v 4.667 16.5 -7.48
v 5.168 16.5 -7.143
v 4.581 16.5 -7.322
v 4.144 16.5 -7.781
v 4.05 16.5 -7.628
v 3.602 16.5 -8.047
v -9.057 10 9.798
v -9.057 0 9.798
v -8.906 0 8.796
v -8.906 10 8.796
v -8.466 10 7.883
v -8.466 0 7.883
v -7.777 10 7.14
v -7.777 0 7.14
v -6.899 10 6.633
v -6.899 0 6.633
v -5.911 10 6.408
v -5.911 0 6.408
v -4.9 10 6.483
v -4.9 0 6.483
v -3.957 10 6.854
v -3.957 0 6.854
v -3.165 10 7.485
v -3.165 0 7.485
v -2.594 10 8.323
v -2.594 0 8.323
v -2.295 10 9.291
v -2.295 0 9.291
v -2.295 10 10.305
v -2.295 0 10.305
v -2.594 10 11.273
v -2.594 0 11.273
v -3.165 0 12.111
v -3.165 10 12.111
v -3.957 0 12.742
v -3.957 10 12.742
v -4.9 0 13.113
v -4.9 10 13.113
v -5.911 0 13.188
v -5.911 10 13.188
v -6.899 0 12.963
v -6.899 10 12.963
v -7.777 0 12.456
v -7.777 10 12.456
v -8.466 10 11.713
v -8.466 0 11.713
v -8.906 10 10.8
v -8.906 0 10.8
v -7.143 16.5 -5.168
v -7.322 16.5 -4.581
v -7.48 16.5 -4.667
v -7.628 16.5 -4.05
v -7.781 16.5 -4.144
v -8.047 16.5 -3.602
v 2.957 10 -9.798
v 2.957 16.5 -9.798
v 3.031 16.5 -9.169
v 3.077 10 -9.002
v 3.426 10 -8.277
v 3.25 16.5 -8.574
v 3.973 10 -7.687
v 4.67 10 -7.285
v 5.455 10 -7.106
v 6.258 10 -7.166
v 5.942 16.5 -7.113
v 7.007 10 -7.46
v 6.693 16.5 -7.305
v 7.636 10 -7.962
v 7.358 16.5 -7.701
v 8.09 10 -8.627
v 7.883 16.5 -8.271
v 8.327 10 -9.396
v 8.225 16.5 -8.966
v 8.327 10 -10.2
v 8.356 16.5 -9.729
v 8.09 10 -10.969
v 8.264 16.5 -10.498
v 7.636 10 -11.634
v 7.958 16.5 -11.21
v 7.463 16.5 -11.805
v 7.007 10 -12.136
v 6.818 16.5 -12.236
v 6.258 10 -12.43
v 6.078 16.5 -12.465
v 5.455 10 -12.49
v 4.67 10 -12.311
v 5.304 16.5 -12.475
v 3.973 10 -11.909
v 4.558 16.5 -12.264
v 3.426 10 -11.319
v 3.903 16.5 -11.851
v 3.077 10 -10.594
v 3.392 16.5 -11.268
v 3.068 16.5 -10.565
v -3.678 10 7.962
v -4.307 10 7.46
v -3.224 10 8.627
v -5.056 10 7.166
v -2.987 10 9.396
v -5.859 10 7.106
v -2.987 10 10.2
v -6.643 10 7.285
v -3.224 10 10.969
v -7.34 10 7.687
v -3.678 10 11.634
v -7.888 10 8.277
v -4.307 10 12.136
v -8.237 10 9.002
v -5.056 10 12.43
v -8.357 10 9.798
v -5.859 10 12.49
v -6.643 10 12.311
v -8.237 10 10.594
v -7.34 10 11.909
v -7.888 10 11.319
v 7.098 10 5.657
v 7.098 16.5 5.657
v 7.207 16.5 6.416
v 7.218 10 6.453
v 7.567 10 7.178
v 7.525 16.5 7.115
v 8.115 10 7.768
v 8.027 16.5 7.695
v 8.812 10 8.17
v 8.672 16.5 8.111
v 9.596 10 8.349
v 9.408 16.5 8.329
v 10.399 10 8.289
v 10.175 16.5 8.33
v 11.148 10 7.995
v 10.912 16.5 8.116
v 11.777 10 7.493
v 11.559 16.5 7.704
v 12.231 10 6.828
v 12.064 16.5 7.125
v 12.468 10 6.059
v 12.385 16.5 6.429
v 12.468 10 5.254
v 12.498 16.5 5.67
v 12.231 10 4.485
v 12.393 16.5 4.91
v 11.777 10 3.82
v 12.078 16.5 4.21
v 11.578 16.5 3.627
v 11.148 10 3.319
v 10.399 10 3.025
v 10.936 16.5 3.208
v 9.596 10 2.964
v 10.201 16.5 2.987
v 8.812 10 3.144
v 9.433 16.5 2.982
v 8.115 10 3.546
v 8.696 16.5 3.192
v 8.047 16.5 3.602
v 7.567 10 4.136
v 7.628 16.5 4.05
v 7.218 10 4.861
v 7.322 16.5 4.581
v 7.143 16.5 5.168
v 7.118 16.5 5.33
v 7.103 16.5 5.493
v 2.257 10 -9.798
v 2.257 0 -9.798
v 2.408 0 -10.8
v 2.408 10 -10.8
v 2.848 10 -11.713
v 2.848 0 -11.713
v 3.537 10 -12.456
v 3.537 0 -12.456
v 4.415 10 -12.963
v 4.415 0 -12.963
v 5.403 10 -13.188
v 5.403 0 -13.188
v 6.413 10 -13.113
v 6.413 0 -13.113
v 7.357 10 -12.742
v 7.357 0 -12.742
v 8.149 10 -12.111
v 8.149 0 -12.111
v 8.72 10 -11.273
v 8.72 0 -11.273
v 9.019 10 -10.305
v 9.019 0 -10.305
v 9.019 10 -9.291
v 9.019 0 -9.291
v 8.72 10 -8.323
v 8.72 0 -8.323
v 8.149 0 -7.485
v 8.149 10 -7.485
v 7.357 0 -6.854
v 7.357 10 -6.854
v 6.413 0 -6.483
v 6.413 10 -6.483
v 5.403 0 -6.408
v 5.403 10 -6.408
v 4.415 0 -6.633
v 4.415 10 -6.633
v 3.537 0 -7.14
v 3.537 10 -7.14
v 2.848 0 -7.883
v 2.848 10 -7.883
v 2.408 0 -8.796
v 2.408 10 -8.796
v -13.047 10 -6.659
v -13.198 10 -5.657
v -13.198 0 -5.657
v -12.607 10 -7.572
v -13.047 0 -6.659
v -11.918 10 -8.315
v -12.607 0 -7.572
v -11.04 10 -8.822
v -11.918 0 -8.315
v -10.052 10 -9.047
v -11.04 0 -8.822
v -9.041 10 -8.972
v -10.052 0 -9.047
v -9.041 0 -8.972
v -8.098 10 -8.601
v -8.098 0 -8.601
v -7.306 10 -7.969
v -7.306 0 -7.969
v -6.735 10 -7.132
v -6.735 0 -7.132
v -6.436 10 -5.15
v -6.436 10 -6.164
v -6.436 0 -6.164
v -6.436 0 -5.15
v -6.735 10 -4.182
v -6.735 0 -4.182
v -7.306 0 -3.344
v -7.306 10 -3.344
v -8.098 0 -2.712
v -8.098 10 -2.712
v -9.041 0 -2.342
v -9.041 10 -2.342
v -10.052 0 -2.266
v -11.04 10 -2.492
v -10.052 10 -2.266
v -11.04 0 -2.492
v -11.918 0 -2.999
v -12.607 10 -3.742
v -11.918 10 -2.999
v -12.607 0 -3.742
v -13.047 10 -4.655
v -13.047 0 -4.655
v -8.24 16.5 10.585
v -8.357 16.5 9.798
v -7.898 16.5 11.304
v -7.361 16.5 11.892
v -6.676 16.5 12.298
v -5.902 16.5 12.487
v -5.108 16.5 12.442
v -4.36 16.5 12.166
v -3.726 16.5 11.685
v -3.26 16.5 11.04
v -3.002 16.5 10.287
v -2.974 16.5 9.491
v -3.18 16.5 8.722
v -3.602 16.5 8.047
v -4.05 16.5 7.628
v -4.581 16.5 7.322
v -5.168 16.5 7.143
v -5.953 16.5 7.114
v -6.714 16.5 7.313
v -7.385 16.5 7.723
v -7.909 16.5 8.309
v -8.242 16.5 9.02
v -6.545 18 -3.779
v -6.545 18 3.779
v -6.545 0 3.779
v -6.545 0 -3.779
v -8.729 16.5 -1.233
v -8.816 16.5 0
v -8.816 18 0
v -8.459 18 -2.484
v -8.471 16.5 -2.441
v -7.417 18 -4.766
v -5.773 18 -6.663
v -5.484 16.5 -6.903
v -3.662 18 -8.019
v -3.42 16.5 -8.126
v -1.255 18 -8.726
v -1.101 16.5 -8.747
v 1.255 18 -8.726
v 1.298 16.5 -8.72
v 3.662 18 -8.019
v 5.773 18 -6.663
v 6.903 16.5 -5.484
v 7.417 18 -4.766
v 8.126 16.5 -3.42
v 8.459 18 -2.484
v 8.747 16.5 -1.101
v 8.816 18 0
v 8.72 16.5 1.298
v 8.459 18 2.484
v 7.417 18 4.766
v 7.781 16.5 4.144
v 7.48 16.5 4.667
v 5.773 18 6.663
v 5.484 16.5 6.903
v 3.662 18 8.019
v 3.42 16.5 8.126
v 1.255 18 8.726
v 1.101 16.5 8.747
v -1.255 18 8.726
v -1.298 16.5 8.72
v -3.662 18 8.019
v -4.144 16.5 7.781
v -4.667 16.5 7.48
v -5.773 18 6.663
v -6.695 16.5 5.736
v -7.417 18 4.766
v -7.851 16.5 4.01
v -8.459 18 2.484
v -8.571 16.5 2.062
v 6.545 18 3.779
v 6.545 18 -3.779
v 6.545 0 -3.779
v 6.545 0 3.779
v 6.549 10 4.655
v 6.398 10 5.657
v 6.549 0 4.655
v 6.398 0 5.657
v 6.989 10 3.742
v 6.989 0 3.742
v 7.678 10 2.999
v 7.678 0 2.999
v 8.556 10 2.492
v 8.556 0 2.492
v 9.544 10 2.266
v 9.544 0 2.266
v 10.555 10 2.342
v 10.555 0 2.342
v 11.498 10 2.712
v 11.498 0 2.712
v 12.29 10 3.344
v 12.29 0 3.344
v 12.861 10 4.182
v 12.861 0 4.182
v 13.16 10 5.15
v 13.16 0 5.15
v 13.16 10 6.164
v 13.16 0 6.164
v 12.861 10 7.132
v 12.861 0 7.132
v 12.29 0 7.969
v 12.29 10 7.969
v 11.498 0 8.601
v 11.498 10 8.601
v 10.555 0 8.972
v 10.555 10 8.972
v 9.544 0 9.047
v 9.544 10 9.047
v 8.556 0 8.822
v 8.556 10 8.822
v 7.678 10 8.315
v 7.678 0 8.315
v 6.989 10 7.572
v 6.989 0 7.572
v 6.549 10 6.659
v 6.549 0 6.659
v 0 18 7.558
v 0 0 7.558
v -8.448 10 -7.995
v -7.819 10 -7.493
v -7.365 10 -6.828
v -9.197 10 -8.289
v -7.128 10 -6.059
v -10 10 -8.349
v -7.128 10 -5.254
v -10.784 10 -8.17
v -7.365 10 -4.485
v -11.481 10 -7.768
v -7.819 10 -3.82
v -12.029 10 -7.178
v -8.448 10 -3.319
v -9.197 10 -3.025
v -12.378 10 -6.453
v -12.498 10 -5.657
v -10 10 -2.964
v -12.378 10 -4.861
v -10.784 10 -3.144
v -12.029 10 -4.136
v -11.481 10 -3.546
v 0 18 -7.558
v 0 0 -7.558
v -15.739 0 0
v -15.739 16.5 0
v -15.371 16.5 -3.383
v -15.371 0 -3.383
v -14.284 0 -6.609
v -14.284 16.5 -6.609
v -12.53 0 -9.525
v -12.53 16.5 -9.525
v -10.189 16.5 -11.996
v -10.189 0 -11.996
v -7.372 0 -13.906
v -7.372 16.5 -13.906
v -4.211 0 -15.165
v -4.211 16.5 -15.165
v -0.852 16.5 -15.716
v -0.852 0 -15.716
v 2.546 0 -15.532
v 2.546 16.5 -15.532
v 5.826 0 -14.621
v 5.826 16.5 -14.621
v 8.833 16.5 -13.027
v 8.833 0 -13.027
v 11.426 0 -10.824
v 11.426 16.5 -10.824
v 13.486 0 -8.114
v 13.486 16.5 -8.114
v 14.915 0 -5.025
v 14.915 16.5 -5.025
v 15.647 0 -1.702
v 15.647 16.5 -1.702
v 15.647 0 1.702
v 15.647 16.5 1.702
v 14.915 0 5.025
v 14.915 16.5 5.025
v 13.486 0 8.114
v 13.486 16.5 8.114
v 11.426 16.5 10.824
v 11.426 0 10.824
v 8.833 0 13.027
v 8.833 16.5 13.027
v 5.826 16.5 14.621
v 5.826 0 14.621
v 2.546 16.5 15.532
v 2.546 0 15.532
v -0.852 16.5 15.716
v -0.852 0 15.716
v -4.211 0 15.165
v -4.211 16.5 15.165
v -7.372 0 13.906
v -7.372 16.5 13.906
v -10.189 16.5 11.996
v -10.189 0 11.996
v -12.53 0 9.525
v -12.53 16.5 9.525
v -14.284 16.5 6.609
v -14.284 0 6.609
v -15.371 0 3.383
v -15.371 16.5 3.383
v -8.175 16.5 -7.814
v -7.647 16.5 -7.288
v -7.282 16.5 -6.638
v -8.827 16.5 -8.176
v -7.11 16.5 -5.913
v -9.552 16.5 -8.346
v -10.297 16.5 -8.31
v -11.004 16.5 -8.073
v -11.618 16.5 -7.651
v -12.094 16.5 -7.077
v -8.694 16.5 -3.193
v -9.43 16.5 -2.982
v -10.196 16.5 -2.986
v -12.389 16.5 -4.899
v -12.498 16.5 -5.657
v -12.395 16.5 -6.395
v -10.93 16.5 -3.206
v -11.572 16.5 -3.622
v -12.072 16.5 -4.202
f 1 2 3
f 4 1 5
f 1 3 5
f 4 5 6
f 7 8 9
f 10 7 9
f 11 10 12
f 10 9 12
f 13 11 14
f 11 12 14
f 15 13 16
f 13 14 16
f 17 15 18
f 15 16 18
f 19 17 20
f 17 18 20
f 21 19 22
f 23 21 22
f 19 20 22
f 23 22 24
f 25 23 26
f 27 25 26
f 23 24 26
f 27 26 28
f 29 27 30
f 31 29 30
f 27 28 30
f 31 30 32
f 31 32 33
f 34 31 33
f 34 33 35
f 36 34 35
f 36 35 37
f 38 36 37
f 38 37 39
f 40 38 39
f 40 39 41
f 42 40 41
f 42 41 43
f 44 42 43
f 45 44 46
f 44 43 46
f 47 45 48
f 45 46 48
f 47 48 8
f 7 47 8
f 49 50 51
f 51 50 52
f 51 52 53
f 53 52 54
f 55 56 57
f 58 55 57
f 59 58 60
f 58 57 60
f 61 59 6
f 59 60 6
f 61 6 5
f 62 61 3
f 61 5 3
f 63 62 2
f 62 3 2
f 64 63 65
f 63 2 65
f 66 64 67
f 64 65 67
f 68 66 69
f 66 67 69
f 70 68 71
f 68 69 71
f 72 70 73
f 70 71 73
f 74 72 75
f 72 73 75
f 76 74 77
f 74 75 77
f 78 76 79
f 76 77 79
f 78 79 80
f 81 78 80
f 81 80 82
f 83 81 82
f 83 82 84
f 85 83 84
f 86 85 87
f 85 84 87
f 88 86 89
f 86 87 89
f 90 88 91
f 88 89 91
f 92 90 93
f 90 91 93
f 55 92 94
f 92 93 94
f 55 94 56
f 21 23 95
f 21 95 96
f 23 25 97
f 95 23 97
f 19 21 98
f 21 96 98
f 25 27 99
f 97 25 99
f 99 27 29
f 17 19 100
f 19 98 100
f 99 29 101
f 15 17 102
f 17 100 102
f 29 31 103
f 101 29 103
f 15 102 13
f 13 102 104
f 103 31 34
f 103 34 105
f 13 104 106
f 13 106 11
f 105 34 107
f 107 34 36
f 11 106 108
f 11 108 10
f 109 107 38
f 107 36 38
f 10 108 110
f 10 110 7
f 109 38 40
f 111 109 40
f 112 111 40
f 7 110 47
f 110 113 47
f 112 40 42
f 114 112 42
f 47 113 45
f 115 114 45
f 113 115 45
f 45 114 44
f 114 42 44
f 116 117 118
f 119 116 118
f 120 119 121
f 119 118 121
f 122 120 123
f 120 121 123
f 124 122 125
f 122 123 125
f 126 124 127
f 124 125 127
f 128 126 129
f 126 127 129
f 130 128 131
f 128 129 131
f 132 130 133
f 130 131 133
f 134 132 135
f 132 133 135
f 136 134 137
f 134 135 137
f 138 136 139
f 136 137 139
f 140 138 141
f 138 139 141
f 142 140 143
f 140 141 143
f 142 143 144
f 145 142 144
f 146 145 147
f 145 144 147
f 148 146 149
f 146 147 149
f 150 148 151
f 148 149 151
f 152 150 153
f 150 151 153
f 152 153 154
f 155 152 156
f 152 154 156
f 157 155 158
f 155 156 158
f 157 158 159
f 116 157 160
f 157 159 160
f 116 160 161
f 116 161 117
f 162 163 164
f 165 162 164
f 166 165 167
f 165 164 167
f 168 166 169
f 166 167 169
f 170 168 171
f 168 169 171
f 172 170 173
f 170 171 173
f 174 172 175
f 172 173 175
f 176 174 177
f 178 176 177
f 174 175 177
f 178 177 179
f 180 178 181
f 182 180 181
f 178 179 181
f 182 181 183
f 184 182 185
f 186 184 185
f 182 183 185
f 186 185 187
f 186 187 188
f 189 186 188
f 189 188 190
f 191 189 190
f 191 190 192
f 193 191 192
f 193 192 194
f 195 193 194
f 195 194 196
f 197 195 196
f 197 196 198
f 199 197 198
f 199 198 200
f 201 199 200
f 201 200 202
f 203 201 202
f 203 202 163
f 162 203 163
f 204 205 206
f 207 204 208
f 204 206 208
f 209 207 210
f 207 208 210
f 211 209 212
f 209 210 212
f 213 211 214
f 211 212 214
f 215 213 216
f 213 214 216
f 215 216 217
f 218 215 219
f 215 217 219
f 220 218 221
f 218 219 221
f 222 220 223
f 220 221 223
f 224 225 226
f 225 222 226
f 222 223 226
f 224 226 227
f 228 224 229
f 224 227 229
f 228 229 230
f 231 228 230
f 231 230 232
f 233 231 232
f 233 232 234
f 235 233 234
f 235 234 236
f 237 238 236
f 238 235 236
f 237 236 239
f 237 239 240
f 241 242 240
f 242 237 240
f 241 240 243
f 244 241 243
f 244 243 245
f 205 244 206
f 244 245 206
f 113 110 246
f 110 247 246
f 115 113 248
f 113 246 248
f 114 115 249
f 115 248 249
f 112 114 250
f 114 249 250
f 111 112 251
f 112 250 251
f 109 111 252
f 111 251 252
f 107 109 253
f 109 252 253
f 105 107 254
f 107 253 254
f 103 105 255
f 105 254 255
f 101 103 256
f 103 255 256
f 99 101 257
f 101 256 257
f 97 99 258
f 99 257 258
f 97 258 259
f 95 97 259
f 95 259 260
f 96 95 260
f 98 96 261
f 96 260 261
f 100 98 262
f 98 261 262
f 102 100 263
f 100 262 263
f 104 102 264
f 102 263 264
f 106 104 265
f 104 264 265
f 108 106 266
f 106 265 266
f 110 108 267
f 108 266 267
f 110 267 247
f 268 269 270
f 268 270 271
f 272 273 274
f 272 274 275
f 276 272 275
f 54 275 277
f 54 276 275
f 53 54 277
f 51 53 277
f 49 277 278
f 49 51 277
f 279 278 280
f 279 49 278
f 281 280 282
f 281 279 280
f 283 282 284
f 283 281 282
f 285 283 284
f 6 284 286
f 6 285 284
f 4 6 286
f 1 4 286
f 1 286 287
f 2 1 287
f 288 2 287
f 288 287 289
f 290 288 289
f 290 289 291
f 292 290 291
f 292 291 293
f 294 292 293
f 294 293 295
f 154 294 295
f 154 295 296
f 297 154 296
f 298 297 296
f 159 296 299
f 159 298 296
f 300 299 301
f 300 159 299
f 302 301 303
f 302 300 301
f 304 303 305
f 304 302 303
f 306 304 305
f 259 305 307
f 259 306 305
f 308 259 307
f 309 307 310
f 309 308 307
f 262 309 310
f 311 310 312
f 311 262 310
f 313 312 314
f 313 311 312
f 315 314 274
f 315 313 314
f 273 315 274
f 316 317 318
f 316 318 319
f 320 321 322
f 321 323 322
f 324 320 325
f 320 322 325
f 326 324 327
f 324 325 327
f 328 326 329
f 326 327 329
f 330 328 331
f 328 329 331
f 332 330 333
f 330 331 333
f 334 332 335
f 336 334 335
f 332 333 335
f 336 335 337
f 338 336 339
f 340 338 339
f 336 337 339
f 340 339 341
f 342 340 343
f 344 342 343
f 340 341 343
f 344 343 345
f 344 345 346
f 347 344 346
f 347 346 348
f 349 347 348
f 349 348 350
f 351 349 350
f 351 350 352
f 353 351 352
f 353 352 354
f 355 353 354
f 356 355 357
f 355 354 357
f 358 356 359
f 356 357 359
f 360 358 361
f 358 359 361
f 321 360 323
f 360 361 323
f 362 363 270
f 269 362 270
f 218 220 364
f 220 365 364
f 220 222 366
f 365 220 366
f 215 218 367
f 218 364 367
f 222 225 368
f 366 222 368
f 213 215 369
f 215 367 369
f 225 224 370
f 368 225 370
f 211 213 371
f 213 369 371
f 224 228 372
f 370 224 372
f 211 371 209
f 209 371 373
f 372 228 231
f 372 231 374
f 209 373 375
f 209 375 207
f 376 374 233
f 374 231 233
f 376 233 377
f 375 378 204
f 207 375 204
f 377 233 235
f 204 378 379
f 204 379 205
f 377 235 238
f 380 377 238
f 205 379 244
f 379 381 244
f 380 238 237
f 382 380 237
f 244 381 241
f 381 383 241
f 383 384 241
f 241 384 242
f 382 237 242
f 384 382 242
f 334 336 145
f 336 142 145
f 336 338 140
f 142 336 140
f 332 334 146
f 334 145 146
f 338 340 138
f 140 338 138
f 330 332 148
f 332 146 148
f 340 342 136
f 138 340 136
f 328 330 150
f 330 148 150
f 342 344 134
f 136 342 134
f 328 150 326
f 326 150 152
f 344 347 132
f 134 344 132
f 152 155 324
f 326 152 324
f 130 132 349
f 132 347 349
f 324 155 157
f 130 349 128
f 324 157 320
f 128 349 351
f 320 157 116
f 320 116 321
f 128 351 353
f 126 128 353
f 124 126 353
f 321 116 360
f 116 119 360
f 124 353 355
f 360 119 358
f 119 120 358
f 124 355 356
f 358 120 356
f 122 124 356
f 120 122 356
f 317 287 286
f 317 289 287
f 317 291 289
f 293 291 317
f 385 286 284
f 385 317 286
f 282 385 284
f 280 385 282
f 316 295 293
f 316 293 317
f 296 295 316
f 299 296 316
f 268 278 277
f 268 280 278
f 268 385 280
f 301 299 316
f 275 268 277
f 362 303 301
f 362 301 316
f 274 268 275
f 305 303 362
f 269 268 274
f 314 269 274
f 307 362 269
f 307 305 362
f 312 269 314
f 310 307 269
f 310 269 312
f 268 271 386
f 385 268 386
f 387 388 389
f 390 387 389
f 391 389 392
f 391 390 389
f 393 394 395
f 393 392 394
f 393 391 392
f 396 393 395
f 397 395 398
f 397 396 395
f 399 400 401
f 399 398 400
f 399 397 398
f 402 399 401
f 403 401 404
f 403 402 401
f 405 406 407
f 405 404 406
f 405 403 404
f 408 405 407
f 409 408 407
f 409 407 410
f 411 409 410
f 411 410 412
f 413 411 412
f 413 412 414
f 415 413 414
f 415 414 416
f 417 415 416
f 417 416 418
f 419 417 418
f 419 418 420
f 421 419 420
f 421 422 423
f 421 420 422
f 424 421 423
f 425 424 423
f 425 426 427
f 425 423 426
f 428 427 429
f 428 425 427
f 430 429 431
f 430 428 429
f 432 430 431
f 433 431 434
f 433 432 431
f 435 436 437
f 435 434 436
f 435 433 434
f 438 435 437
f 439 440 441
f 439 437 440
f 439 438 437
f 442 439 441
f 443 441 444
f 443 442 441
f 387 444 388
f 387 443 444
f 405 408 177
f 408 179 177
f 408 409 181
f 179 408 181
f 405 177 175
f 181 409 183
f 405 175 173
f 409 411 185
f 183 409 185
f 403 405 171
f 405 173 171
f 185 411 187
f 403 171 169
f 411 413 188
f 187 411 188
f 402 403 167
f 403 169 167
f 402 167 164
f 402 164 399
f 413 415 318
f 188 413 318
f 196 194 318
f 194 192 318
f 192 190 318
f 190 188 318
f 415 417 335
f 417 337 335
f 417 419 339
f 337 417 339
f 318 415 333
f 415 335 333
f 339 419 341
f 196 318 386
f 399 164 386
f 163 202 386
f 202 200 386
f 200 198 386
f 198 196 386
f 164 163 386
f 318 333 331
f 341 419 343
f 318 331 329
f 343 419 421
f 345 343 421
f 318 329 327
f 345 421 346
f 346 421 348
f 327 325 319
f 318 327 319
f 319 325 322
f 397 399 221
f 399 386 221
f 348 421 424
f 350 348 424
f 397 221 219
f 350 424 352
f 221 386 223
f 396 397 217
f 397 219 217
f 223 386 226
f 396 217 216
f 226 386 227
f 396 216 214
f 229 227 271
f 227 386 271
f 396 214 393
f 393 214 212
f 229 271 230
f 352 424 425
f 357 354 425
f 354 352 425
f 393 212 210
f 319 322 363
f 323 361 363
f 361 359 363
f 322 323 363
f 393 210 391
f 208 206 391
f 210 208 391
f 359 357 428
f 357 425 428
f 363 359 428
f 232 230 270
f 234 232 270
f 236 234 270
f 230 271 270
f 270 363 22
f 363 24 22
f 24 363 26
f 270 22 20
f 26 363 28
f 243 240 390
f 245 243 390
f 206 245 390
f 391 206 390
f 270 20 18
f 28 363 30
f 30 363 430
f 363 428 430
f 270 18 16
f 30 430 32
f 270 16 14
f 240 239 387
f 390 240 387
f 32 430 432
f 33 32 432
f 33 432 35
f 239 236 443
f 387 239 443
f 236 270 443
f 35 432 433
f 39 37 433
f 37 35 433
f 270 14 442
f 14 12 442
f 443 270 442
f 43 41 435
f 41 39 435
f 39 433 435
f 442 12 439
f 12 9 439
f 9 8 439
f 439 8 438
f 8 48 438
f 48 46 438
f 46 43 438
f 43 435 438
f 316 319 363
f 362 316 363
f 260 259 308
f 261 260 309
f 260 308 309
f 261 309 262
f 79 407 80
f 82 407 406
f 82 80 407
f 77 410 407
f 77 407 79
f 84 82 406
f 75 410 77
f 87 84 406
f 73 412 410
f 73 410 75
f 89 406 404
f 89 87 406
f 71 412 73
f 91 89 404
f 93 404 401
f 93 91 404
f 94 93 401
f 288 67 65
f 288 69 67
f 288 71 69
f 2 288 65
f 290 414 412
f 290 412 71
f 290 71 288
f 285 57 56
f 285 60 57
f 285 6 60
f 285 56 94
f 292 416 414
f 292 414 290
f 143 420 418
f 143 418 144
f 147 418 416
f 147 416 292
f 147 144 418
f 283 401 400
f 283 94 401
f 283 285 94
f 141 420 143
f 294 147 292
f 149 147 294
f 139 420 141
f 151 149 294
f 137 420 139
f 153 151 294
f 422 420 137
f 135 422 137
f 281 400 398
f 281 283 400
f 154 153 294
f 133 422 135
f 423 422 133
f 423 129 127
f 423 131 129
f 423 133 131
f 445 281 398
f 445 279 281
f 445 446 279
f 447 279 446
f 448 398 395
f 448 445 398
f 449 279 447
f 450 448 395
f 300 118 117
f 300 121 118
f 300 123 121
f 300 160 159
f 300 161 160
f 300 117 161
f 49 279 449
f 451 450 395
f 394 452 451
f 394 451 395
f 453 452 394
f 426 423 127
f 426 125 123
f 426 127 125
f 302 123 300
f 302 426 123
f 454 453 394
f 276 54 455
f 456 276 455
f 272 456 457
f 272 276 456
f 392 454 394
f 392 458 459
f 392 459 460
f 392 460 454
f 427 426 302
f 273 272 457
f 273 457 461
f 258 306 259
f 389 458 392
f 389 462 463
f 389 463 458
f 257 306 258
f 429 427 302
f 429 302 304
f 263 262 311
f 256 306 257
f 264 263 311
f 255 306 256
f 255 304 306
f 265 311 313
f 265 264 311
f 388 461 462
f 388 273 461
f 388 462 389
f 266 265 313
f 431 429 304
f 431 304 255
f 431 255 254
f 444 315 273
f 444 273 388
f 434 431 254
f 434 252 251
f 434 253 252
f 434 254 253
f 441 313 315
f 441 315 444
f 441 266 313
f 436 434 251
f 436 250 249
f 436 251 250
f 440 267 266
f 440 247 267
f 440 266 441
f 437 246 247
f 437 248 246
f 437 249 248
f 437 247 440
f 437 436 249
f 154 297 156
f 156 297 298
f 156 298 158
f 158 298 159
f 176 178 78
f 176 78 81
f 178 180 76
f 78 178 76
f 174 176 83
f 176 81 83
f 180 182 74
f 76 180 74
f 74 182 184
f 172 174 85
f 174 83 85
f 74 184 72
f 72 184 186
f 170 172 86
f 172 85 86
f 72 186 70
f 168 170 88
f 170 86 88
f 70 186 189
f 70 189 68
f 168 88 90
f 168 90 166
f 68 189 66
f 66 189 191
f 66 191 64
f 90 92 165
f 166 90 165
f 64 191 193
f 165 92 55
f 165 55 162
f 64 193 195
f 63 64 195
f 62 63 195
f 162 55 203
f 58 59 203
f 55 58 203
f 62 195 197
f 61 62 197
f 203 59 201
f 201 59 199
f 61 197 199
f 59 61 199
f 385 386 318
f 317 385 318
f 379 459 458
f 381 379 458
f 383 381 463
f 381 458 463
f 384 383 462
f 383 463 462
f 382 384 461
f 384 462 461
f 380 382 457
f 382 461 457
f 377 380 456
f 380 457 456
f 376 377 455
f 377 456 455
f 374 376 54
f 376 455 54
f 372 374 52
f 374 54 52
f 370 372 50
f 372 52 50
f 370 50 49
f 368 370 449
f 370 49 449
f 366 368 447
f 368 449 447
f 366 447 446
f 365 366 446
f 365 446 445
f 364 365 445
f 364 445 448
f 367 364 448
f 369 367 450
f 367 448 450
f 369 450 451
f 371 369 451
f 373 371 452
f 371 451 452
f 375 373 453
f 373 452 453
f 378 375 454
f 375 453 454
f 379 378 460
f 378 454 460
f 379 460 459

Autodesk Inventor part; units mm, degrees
ref_plane "YZ Plane" through (0, 0, 0) normal (1, 0, 0) x (0, 1, 0)
ref_plane "XZ Plane" through (0, 0, 0) normal (0, 1, 0) x (-1, 0, 0)
sketch "Sketch1" plane through (0, 0, 0) normal (0, 1, 0) x (-1, 0, 0)
  circle A0 centre (9.798, -5.6569) radius 3.4
  circle A1 centre (0, 0) radius 15.739
  line L0 (0, -7.5575) -> (-6.545, -3.7788)
  line L1 (-6.545, -3.7788) -> (-6.545, 3.7788)
  line L2 (-6.545, 3.7788) -> (0, 7.5575)
  line L3 (0, 7.5575) -> (6.545, 3.7788)
  line L4 (6.545, 3.7788) -> (6.545, -3.7788)
  line L5 (6.545, -3.7788) -> (0, -7.5575)
  circle A2 centre (5.6569, 9.798) radius 3.4
  circle A3 centre (-9.798, 5.6569) radius 3.4
  circle A4 centre (-5.6569, -9.798) radius 3.4
  circle A5 centre (5.6569, 9.798) radius 1.86 projected
  circle A6 centre (0, 0) radius 8.8161
  circle A7 centre (5.6569, 9.798) radius 2.7
  circle A8 centre (-9.798, 5.6569) radius 2.7
  circle A9 centre (-5.6569, -9.798) radius 2.7
  circle A10 centre (9.798, -5.6569) radius 2.7
  point P0 (0, 0)
  dimension "d0" = 31.478
  dimension "d3" = 13.09
  dimension "d4" = 6.8
  dimension "d7" = 360
  dimension "d13" = 5.4
  dimension "d16" = 360
extrude "Extrusion1" add sketch "Sketch1" along normal blind 16.5 contours A0 A6 A4 A3 A2 | A1
ref_plane "Work Plane1" through (-24.2096, 24.4273, -24.2096) normal (0, 1, 0) x (0.0853, 0, 0.9964)
extrude "Extrusion2" add sketch "Sketch1" along normal blind 1.5 from surface at 16.5 contours A6 A10 A0 | A0 A6 A4 A3 A2 | A6 A10 | A6 A9 A4 | A2 A6 A7 | A6 A9 | A7 A6 | A6 A8 A3 | A6 A8 picked at (7.7135, -3.2903) picked at (7.577, -4.2584) picked at (-3.2903, -7.7135) picked at (5.035, 6.7062) picked at (-4.2584, -7.577) picked at (4.4327, 7.4764) picked at (-6.8562, 4.5301) picked at (-7.577, 4.2584)
extrude "Extrusion4" add sketch "Sketch1" against normal blind 6.5 from surface at 16.5 contours A0 A6 A10 | A6 A10 A0 | A6 A9 A4 | A4 A6 A9 | A6 A7 A2 | A2 A6 A7 | A6 A8 A3 | A3 A6 A8
properties part number "GoBilda Mech Hub 0500 Hex Spacer  inserts"
